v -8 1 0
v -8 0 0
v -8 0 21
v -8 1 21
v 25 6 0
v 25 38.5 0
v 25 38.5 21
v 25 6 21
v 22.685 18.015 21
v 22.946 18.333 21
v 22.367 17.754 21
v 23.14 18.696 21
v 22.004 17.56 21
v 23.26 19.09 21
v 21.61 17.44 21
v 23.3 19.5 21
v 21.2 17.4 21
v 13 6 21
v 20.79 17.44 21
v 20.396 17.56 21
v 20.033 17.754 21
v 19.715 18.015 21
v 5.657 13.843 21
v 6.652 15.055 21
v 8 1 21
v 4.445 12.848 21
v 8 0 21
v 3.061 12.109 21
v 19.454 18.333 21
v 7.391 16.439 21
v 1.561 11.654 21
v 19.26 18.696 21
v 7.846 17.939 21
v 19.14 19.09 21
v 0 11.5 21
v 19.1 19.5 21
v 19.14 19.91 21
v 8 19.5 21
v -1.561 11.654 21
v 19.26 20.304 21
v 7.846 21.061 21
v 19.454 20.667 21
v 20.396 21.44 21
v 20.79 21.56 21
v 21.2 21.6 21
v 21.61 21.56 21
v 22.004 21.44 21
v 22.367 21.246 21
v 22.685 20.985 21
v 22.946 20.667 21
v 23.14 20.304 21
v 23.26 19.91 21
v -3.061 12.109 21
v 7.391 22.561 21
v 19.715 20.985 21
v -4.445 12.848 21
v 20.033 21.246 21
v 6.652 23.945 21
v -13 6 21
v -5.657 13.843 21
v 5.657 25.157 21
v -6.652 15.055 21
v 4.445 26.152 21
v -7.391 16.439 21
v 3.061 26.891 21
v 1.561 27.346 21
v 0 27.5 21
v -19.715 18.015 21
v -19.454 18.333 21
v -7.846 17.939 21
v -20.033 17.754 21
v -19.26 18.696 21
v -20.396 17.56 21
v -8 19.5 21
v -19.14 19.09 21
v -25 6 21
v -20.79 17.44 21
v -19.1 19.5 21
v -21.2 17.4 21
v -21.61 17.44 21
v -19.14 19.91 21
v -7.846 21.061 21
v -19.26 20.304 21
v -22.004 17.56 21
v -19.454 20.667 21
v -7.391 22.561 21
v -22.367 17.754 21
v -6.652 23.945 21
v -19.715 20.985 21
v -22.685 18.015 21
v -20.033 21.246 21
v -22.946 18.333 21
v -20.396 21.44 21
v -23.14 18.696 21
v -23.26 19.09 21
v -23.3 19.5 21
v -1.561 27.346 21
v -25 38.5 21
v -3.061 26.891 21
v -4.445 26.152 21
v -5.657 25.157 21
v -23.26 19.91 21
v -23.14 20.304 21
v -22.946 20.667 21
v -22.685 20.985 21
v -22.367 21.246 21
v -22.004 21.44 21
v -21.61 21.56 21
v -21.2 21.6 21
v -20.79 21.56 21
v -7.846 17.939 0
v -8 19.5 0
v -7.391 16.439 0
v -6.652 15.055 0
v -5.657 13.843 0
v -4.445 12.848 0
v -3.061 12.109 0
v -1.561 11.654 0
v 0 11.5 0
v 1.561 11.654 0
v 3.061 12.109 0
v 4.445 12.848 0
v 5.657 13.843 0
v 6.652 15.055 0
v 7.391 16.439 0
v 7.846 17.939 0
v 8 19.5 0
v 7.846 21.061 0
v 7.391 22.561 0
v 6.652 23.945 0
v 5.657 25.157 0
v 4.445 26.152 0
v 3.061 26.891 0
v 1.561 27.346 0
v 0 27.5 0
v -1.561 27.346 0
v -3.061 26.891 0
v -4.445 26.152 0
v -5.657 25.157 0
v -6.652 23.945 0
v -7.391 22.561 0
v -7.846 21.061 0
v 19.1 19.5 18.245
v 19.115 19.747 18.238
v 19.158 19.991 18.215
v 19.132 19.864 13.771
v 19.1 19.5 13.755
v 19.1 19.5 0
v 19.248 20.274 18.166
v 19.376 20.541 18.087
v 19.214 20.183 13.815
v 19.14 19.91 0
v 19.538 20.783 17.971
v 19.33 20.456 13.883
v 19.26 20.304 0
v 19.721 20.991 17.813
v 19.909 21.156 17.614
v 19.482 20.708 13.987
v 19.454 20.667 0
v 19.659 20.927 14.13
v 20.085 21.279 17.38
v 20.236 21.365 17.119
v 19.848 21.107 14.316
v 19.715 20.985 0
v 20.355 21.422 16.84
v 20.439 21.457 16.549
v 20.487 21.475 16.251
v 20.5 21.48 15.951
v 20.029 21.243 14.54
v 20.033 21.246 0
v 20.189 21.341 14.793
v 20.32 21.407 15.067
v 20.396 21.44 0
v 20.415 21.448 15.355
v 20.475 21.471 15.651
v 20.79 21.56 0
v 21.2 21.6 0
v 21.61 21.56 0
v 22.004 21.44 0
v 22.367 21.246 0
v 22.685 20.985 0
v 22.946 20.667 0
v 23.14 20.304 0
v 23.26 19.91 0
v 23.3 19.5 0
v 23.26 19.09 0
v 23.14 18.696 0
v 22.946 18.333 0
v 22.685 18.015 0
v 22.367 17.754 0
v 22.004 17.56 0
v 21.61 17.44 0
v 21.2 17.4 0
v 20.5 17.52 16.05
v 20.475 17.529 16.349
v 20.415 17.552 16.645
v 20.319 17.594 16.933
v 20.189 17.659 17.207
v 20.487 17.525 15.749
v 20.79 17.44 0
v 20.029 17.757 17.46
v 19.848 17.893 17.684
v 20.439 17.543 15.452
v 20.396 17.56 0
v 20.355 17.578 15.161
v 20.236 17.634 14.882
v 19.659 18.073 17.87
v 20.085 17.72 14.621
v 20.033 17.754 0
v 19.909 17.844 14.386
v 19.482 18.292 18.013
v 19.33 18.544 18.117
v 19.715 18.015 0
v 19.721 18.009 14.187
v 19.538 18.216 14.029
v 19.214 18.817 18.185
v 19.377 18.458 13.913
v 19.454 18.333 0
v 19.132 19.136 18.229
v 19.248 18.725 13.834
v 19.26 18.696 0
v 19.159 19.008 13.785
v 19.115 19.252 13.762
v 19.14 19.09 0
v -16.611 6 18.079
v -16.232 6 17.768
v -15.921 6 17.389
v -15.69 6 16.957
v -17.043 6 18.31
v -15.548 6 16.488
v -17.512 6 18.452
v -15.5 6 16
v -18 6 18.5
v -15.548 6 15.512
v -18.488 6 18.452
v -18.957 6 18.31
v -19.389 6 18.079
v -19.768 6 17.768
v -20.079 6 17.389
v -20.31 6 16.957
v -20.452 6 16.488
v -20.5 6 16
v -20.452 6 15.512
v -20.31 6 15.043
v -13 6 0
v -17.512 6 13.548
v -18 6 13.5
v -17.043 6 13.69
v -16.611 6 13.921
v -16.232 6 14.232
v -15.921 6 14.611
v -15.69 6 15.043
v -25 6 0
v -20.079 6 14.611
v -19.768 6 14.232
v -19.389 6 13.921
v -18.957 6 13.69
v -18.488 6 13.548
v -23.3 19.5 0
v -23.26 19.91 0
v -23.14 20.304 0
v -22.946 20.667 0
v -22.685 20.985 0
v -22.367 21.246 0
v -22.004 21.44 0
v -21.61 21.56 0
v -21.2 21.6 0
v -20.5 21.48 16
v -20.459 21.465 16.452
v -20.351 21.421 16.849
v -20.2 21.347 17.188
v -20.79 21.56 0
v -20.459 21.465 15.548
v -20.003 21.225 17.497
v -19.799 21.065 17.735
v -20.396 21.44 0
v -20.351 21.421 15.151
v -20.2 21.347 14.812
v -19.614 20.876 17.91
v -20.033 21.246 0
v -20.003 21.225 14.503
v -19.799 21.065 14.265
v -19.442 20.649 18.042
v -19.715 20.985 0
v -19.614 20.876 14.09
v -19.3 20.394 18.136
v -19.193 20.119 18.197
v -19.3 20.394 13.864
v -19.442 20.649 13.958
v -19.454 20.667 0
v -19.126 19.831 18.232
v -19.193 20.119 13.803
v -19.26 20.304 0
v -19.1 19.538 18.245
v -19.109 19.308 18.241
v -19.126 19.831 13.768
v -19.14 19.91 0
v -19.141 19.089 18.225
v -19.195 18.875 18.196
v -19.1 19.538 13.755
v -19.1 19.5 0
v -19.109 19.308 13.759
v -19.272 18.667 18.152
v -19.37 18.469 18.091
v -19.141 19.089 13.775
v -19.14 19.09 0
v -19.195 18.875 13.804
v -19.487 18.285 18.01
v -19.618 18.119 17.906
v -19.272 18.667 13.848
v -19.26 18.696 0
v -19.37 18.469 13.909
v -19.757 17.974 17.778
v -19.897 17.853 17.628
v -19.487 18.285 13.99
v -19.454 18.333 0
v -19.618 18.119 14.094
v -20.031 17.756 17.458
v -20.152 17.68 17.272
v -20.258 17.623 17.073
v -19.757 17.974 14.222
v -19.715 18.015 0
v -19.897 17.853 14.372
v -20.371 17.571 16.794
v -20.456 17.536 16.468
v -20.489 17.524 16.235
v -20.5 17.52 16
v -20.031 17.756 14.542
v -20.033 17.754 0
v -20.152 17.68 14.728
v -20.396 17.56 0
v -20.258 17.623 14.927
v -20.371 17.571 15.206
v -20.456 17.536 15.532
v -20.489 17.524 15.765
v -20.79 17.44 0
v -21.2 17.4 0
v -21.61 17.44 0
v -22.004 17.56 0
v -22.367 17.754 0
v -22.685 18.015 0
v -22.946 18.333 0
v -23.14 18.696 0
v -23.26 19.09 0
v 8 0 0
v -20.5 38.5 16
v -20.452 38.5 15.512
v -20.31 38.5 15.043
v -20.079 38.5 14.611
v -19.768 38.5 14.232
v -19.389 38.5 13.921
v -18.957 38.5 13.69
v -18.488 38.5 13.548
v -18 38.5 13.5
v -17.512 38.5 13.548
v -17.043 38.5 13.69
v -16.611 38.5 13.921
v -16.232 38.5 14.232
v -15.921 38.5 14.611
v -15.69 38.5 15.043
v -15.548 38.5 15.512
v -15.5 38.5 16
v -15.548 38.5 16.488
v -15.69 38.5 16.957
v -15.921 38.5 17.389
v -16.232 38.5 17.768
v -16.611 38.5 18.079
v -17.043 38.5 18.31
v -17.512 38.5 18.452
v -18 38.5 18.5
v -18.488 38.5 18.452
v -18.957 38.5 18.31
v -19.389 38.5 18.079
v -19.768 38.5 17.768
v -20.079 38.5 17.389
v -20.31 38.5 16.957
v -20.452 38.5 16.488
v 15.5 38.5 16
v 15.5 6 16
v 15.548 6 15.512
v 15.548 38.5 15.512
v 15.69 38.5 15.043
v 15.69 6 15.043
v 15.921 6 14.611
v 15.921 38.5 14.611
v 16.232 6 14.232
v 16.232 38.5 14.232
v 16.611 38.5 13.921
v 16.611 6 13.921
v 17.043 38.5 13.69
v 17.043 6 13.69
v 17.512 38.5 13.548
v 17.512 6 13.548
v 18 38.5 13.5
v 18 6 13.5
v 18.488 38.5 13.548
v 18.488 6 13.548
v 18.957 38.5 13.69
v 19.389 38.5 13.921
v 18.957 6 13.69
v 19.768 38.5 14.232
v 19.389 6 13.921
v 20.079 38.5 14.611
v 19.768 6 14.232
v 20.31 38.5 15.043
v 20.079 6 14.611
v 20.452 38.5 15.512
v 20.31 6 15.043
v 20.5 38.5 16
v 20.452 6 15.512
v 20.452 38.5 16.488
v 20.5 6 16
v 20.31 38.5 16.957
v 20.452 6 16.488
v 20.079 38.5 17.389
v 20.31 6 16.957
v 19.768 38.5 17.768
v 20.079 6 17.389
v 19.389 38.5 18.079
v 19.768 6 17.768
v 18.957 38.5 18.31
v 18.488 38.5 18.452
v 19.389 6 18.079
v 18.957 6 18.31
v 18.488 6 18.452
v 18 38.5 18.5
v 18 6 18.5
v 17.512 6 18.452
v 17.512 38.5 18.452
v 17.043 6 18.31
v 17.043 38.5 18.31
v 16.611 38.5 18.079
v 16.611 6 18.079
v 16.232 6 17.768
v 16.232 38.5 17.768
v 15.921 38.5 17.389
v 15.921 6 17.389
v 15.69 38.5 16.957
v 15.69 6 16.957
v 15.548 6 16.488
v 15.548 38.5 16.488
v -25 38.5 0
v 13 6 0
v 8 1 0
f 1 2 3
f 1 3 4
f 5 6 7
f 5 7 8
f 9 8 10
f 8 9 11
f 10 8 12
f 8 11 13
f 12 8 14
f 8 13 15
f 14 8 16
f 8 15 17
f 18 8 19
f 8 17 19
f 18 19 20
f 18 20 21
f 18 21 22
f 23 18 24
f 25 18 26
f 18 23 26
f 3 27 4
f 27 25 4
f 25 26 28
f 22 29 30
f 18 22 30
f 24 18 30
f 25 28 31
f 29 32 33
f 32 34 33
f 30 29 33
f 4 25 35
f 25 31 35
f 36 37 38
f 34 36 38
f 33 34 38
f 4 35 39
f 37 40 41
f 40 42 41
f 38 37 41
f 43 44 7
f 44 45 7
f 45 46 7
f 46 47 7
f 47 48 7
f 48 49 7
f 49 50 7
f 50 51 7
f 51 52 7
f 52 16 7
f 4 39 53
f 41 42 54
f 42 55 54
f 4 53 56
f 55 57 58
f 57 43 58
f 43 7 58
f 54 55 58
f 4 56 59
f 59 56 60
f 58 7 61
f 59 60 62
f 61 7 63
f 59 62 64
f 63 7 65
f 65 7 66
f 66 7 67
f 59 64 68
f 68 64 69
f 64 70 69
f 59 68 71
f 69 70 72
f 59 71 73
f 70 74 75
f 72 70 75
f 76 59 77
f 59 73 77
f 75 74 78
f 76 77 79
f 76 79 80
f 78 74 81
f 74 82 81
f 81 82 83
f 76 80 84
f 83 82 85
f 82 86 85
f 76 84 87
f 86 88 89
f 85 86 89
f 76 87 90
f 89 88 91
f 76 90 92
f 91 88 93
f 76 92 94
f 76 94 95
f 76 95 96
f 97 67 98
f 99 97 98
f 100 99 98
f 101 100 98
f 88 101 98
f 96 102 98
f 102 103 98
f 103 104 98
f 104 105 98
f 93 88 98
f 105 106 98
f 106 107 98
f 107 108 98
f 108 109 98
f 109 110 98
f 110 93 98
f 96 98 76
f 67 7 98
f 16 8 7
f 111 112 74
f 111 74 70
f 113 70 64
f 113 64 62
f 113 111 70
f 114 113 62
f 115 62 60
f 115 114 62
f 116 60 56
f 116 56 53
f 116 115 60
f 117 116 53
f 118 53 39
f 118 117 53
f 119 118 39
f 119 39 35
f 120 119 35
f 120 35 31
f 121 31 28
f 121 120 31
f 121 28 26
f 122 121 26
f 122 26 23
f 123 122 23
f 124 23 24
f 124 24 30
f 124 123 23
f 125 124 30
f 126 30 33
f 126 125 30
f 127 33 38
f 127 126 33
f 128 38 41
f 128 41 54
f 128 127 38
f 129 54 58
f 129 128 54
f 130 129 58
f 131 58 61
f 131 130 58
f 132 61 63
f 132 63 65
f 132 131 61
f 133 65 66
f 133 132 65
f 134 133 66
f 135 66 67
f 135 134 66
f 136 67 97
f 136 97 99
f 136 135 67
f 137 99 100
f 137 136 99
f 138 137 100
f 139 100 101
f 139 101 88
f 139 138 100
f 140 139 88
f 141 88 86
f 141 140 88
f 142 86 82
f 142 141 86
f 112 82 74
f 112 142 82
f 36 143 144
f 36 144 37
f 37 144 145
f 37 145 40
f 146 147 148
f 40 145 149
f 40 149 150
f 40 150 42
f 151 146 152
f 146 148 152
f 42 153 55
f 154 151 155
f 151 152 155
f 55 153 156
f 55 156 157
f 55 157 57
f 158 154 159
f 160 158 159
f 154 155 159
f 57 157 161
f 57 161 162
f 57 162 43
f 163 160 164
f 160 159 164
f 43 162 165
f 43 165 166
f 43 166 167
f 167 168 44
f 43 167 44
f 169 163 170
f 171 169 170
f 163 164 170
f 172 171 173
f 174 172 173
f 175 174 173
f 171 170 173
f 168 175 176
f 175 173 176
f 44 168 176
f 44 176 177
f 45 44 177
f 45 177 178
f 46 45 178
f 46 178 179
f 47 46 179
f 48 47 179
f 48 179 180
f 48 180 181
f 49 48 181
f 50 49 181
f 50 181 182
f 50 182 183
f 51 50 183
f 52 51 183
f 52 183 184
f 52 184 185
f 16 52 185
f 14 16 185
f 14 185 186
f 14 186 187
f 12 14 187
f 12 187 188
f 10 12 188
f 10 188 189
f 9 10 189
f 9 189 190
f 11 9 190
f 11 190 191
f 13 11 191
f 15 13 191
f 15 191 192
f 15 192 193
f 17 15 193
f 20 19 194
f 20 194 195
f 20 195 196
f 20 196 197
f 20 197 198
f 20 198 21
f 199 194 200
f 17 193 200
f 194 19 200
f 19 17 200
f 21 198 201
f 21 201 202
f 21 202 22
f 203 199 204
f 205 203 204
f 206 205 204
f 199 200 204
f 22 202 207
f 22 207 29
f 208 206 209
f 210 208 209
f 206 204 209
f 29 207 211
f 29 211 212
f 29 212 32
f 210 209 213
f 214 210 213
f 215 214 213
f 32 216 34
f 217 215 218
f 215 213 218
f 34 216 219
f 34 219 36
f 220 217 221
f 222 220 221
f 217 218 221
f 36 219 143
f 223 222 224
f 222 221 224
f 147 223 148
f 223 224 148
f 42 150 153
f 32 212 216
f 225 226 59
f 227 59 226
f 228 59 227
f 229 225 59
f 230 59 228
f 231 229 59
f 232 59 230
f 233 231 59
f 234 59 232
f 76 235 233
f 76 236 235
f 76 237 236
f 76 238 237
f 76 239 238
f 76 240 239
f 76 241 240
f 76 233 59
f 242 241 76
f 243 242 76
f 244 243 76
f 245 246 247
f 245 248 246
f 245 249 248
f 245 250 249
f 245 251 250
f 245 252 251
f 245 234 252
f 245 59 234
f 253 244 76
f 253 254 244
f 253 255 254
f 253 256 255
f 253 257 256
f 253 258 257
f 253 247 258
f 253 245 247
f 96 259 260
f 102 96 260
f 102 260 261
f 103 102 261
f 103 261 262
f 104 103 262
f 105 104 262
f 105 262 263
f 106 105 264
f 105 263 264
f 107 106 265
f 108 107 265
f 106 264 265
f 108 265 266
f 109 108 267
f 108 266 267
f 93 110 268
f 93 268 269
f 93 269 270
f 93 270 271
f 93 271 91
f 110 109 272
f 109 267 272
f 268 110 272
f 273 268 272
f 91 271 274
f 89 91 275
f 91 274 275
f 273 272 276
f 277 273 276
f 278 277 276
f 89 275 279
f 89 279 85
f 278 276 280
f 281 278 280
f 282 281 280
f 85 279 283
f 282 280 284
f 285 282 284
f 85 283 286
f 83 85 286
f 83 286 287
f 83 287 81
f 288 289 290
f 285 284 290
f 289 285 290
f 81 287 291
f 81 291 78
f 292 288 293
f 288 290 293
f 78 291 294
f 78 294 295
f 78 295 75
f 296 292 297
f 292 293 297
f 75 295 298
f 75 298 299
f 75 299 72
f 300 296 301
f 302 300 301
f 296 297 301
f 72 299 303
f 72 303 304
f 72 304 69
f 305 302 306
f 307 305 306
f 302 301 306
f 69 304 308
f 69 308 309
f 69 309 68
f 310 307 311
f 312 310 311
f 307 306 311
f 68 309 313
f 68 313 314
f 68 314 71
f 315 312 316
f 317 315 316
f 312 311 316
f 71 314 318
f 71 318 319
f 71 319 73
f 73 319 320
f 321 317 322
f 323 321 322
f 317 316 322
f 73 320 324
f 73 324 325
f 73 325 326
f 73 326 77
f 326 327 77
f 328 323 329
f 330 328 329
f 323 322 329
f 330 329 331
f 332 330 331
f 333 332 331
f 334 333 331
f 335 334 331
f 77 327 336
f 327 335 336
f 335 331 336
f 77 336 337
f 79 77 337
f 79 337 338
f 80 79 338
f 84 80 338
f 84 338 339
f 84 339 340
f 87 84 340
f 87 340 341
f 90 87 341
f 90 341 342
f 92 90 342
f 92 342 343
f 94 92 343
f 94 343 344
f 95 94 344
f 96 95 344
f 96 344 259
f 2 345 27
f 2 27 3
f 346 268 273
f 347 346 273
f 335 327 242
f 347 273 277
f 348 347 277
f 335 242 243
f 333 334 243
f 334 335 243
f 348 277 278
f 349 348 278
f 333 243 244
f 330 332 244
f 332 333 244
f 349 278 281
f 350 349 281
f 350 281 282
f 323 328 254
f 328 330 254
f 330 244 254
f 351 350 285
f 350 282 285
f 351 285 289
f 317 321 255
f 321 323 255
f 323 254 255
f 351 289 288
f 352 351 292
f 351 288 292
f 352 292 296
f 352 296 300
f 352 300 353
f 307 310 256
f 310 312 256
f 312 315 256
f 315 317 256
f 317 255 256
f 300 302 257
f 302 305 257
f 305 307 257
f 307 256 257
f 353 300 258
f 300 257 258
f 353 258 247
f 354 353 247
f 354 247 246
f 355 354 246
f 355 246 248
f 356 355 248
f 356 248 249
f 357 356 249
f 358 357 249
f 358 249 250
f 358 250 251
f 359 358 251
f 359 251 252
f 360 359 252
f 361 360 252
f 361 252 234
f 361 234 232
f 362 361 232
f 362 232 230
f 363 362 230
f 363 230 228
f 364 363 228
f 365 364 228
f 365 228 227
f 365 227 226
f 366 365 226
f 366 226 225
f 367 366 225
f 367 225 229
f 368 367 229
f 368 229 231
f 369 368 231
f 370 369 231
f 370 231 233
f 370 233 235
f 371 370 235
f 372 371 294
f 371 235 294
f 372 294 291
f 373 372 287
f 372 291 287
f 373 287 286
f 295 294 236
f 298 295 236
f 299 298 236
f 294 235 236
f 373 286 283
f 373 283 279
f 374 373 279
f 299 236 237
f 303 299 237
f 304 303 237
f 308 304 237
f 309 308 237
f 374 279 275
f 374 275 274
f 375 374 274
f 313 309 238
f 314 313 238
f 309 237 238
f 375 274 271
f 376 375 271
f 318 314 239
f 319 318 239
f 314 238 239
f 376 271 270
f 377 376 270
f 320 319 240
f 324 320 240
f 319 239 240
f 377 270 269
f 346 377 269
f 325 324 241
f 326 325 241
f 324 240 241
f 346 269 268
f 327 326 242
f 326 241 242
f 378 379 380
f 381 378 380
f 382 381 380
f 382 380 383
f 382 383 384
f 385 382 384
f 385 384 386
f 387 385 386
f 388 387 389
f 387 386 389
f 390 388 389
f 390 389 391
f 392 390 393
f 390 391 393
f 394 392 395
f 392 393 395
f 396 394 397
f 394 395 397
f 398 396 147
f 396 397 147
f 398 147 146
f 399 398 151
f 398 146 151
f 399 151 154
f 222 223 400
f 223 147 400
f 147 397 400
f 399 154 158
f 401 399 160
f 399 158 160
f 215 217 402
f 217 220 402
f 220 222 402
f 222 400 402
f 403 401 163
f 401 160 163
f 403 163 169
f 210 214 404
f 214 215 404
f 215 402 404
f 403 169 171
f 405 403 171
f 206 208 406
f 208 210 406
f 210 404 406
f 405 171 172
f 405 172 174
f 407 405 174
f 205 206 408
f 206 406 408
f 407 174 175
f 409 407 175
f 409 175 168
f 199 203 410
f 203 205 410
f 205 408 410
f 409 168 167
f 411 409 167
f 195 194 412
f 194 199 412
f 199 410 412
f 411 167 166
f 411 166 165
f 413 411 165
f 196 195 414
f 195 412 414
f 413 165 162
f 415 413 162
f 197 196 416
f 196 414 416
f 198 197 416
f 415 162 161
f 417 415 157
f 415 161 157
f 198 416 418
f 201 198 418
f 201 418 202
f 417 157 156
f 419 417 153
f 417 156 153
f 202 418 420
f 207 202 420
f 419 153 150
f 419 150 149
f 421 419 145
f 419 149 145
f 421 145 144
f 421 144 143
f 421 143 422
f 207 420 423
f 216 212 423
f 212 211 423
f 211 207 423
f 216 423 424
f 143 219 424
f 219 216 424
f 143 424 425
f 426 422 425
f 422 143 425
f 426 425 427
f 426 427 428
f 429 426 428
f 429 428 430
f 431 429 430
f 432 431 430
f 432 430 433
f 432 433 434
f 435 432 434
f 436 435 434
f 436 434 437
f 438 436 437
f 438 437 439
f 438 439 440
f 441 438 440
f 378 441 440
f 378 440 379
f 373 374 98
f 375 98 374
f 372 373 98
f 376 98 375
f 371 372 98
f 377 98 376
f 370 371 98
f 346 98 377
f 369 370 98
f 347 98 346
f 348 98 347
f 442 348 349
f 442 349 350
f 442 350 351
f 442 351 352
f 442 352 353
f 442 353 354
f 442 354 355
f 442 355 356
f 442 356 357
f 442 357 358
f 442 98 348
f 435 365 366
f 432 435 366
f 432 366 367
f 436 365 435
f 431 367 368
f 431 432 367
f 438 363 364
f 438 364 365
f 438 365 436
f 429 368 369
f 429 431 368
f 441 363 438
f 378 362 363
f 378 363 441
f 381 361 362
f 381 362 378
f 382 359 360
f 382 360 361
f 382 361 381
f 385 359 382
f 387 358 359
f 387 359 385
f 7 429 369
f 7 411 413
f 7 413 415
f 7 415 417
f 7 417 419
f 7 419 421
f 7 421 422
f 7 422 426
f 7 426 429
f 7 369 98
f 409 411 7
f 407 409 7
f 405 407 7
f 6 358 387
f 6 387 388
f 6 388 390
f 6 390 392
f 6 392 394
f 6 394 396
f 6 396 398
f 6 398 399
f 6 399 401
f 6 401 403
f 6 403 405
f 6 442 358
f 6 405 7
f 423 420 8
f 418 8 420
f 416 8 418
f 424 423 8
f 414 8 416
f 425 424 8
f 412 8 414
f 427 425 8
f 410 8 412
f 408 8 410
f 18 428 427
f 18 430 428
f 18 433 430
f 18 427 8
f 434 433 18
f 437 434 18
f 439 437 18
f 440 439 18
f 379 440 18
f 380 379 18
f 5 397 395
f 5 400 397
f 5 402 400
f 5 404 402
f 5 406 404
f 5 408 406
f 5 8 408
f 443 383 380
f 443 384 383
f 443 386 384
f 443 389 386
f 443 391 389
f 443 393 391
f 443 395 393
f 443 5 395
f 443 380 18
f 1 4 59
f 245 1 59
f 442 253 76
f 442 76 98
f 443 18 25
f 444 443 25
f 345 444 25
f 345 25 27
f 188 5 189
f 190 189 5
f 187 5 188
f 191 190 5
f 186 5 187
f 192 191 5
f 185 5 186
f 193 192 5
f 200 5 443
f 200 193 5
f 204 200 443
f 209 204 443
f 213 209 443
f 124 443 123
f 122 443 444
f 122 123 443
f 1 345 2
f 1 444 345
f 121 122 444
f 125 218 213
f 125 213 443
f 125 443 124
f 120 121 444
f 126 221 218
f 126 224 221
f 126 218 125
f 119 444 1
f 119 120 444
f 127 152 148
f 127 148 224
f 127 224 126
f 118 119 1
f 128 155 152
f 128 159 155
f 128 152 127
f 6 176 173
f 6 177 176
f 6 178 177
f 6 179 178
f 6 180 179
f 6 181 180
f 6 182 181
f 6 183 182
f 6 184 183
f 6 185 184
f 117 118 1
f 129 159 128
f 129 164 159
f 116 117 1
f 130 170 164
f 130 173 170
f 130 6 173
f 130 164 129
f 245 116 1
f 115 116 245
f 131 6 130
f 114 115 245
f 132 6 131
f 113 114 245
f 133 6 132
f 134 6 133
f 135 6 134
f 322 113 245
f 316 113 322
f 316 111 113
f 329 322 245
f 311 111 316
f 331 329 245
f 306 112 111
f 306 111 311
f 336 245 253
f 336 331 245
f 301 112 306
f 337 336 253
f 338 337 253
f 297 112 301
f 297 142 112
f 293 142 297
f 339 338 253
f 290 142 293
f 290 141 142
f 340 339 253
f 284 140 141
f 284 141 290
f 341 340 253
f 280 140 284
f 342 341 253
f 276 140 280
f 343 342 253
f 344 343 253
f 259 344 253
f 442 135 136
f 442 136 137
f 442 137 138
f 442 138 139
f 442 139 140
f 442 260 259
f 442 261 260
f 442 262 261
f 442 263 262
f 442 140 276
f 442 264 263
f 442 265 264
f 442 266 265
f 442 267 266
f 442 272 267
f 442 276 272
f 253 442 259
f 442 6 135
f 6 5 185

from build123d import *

# Parameters (mm, degrees)
SKETCH_1_R            = 8
EXTRUDE_1_DEPTH       = 21
HOLE_WIZARD_M5_1_D    = 4.2
HOLE_WIZARD_5_0_5_1_D = 5


with BuildPart() as part:
    # 草图1 → 凸台-拉伸1 (new body)
    with BuildSketch(Plane.XY):
        Polygon((8, 0), (-8, 0), (-8, 1), (-13, 6), (-25, 6), (-25, 38.5), (25, 38.5), (25, 6), (13, 6), (8, 1), align=None)
        with Locations(Location((0, 19.5, 0), (0, 0, 180))):
            Circle(SKETCH_1_R, mode=Mode.SUBTRACT)
    extrude(amount=EXTRUDE_1_DEPTH)

    # M5 螺纹孔1 (through all)
    with Locations(Plane.XY.offset(21)):
        with Locations((-21.2, 19.5), (21.2, 19.5)):
            Hole(HOLE_WIZARD_M5_1_D / 2)

    # Ø5.0 (5) 直径孔1 (through all)
    with Locations(Plane(origin=(0, 38.5, 0), x_dir=(1, 0, 0), z_dir=(0, 1, 0))):
        with Locations((-18, -16), (18, -16)):
            Hole(HOLE_WIZARD_5_0_5_1_D / 2)


solid = part.part
